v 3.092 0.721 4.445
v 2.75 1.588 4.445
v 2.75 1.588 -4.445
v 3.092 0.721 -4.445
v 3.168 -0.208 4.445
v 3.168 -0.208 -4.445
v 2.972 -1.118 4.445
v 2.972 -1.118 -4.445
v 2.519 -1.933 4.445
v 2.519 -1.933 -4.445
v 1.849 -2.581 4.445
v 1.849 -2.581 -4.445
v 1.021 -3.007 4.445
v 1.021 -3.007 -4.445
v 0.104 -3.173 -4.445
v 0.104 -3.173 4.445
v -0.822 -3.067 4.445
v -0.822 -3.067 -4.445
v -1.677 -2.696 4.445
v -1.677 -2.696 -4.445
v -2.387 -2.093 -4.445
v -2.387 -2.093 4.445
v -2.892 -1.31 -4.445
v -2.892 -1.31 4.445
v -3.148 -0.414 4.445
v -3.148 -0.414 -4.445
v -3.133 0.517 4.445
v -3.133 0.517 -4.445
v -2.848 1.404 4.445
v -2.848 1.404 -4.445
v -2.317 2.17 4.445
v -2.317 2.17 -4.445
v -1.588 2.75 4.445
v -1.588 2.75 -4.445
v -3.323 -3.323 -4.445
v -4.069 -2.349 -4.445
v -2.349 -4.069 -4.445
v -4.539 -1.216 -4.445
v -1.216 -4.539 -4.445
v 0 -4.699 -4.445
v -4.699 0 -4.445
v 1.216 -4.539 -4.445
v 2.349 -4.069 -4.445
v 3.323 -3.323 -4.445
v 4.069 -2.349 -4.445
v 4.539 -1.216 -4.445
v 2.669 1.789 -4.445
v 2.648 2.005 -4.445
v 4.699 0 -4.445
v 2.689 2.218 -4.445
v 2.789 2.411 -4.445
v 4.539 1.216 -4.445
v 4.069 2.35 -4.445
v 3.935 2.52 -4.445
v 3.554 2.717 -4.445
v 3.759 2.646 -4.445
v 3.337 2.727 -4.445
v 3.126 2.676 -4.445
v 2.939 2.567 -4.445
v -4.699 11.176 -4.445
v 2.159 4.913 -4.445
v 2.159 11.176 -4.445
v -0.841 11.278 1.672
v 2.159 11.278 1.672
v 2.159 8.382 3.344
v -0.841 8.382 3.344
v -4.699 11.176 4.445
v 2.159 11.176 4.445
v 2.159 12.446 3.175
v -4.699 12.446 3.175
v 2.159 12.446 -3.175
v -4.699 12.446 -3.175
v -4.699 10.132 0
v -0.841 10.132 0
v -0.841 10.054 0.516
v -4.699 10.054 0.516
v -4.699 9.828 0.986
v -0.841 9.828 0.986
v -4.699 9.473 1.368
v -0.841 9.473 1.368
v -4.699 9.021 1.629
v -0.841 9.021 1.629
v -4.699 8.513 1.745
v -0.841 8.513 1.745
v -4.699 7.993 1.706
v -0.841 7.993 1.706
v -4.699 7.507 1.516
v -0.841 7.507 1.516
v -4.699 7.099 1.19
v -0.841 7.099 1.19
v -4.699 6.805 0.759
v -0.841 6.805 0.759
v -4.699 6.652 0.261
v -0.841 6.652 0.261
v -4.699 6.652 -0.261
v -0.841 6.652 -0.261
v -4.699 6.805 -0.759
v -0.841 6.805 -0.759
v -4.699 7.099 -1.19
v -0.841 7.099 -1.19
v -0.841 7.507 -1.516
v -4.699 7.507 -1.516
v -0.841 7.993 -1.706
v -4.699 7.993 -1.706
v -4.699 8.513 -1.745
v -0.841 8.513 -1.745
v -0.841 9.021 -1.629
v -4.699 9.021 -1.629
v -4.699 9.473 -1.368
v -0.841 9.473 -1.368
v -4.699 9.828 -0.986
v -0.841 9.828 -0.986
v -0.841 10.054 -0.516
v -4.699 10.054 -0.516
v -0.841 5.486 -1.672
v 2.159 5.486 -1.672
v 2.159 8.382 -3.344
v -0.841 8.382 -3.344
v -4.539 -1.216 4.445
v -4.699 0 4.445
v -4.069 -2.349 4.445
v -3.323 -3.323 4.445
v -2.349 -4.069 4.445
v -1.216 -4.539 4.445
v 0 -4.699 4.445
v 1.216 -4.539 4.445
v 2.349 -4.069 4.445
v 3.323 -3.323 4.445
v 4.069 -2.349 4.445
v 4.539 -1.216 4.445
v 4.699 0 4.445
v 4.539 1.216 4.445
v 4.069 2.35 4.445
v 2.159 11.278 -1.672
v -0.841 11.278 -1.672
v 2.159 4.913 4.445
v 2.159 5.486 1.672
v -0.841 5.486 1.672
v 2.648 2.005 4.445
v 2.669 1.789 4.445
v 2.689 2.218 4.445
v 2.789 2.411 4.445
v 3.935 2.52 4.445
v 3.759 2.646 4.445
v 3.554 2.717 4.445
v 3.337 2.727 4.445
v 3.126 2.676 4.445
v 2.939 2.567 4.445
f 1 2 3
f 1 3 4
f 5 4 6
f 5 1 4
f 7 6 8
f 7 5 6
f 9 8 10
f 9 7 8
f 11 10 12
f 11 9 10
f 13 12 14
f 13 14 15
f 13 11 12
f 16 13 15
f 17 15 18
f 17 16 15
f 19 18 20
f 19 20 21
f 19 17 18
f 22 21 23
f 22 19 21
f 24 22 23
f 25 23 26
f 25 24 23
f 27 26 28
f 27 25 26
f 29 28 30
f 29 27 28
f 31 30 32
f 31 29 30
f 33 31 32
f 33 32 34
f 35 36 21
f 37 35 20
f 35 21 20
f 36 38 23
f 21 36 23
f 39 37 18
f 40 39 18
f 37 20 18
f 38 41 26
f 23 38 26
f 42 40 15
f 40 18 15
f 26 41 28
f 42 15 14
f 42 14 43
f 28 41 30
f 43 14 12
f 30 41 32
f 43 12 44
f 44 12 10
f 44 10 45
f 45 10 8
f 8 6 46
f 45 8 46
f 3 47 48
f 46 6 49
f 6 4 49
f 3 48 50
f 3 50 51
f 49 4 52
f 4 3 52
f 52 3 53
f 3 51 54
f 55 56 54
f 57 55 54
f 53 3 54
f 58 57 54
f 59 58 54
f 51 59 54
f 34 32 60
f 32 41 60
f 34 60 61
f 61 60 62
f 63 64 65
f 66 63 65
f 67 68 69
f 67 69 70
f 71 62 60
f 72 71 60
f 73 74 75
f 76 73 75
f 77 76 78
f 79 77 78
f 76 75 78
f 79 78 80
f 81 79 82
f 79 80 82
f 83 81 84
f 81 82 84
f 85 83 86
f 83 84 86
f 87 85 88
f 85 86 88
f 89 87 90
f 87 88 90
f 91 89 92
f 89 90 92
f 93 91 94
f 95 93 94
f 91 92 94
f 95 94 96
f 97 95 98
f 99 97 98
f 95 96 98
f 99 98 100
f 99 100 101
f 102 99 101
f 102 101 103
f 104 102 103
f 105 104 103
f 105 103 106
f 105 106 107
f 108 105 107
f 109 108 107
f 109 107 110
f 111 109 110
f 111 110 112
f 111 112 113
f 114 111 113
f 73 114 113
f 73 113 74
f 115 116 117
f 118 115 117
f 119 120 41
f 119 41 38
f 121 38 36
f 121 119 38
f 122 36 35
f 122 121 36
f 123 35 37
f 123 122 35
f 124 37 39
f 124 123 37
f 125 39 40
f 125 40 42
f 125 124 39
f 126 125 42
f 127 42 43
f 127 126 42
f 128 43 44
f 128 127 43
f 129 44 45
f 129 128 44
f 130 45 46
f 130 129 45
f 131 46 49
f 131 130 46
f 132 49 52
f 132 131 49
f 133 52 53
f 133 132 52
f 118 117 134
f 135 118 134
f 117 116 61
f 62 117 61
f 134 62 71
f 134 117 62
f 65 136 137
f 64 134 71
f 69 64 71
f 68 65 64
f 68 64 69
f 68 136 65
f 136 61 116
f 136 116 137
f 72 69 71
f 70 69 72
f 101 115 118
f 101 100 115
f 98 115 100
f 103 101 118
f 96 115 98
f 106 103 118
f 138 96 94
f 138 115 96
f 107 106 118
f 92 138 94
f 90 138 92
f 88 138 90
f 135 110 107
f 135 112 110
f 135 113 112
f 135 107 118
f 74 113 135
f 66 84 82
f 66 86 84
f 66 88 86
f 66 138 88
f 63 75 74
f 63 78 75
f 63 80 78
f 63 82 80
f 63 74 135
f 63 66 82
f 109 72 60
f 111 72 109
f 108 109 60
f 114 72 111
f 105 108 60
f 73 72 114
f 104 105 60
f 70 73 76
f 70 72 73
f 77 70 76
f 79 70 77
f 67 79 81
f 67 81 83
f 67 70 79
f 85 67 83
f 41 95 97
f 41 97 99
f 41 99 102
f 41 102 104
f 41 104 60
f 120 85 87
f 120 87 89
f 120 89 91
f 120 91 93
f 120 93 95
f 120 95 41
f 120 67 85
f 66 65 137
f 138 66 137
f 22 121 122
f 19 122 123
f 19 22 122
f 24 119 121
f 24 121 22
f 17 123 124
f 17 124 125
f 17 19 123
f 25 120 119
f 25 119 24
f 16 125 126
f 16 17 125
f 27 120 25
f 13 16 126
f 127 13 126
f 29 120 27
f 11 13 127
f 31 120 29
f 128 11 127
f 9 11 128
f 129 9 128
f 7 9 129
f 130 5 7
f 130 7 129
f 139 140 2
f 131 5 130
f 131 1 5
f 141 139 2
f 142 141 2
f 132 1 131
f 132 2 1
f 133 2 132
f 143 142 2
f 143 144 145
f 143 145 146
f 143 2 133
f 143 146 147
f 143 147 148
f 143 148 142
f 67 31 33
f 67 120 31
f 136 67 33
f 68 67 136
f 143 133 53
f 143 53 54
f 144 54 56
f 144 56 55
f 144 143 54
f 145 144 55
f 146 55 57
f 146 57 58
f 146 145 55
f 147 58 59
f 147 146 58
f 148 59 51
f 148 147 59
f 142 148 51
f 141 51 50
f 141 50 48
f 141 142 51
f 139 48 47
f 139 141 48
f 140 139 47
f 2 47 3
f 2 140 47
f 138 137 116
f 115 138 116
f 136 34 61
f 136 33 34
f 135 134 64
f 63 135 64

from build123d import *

# Parameters (mm, degrees)
F1_DEPTH = 4.445
F2_R     = 1.75
F3_DEPTH = 6.859
F5_DEPTH = 3
F6_SIZE  = 1.27


with BuildPart() as f1:
    # F0 (on Top) → F1 (new body, symmetric)
    with BuildSketch(Plane.XY):
        with BuildLine():
            Line((2.159, 12.446), (-4.699, 12.446))
            Line((-4.699, 12.446), (-4.699, 0))
            ThreePointArc((-4.699, 0), (1.2161906929, -4.5388854577), (4.0694533724, 2.3495))
            ThreePointArc((4.0694533724, 2.3495), (3.0285420147, 2.6284113577), (2.749630657, 1.5875))
            ThreePointArc((2.749630657, 1.5875), (-0.8217504682, -3.0668144985), (-1.5875, 2.749630657))
            Line((-1.5875, 2.749630657), (2.159, 4.9126734405))
            Line((2.159, 4.9126734405), (2.159, 12.446))
        make_face()
    extrude(amount=F1_DEPTH, both=True)

    # F2 (on face) → F3 (cut, through all)
    with BuildSketch(Plane.YZ.offset(2.159)):
        with Locations((8.382, 0)):
            Circle(F2_R)
    extrude(amount=-F3_DEPTH, mode=Mode.SUBTRACT)

    # F4 (on face) → F5 (cut)
    with BuildSketch(Plane.YZ.offset(2.159)):
        Polygon((11.2776, -1.6717754395), (11.2776, 1.6717754395), (8.382, 3.3435508789), (5.4864, 1.6717754395), (5.4864, -1.6717754395), (8.382, -3.3435508789), align=None)
    extrude(amount=-F5_DEPTH, mode=Mode.SUBTRACT)

    # F6
    f6_edges = [f1.edges().sort_by_distance(p)[0] for p in [
        (-1.27, 12.446, -4.445),
        (-1.27, 12.446, 4.445),
    ]]
    chamfer(f6_edges, length=F6_SIZE)


solid = f1.part
